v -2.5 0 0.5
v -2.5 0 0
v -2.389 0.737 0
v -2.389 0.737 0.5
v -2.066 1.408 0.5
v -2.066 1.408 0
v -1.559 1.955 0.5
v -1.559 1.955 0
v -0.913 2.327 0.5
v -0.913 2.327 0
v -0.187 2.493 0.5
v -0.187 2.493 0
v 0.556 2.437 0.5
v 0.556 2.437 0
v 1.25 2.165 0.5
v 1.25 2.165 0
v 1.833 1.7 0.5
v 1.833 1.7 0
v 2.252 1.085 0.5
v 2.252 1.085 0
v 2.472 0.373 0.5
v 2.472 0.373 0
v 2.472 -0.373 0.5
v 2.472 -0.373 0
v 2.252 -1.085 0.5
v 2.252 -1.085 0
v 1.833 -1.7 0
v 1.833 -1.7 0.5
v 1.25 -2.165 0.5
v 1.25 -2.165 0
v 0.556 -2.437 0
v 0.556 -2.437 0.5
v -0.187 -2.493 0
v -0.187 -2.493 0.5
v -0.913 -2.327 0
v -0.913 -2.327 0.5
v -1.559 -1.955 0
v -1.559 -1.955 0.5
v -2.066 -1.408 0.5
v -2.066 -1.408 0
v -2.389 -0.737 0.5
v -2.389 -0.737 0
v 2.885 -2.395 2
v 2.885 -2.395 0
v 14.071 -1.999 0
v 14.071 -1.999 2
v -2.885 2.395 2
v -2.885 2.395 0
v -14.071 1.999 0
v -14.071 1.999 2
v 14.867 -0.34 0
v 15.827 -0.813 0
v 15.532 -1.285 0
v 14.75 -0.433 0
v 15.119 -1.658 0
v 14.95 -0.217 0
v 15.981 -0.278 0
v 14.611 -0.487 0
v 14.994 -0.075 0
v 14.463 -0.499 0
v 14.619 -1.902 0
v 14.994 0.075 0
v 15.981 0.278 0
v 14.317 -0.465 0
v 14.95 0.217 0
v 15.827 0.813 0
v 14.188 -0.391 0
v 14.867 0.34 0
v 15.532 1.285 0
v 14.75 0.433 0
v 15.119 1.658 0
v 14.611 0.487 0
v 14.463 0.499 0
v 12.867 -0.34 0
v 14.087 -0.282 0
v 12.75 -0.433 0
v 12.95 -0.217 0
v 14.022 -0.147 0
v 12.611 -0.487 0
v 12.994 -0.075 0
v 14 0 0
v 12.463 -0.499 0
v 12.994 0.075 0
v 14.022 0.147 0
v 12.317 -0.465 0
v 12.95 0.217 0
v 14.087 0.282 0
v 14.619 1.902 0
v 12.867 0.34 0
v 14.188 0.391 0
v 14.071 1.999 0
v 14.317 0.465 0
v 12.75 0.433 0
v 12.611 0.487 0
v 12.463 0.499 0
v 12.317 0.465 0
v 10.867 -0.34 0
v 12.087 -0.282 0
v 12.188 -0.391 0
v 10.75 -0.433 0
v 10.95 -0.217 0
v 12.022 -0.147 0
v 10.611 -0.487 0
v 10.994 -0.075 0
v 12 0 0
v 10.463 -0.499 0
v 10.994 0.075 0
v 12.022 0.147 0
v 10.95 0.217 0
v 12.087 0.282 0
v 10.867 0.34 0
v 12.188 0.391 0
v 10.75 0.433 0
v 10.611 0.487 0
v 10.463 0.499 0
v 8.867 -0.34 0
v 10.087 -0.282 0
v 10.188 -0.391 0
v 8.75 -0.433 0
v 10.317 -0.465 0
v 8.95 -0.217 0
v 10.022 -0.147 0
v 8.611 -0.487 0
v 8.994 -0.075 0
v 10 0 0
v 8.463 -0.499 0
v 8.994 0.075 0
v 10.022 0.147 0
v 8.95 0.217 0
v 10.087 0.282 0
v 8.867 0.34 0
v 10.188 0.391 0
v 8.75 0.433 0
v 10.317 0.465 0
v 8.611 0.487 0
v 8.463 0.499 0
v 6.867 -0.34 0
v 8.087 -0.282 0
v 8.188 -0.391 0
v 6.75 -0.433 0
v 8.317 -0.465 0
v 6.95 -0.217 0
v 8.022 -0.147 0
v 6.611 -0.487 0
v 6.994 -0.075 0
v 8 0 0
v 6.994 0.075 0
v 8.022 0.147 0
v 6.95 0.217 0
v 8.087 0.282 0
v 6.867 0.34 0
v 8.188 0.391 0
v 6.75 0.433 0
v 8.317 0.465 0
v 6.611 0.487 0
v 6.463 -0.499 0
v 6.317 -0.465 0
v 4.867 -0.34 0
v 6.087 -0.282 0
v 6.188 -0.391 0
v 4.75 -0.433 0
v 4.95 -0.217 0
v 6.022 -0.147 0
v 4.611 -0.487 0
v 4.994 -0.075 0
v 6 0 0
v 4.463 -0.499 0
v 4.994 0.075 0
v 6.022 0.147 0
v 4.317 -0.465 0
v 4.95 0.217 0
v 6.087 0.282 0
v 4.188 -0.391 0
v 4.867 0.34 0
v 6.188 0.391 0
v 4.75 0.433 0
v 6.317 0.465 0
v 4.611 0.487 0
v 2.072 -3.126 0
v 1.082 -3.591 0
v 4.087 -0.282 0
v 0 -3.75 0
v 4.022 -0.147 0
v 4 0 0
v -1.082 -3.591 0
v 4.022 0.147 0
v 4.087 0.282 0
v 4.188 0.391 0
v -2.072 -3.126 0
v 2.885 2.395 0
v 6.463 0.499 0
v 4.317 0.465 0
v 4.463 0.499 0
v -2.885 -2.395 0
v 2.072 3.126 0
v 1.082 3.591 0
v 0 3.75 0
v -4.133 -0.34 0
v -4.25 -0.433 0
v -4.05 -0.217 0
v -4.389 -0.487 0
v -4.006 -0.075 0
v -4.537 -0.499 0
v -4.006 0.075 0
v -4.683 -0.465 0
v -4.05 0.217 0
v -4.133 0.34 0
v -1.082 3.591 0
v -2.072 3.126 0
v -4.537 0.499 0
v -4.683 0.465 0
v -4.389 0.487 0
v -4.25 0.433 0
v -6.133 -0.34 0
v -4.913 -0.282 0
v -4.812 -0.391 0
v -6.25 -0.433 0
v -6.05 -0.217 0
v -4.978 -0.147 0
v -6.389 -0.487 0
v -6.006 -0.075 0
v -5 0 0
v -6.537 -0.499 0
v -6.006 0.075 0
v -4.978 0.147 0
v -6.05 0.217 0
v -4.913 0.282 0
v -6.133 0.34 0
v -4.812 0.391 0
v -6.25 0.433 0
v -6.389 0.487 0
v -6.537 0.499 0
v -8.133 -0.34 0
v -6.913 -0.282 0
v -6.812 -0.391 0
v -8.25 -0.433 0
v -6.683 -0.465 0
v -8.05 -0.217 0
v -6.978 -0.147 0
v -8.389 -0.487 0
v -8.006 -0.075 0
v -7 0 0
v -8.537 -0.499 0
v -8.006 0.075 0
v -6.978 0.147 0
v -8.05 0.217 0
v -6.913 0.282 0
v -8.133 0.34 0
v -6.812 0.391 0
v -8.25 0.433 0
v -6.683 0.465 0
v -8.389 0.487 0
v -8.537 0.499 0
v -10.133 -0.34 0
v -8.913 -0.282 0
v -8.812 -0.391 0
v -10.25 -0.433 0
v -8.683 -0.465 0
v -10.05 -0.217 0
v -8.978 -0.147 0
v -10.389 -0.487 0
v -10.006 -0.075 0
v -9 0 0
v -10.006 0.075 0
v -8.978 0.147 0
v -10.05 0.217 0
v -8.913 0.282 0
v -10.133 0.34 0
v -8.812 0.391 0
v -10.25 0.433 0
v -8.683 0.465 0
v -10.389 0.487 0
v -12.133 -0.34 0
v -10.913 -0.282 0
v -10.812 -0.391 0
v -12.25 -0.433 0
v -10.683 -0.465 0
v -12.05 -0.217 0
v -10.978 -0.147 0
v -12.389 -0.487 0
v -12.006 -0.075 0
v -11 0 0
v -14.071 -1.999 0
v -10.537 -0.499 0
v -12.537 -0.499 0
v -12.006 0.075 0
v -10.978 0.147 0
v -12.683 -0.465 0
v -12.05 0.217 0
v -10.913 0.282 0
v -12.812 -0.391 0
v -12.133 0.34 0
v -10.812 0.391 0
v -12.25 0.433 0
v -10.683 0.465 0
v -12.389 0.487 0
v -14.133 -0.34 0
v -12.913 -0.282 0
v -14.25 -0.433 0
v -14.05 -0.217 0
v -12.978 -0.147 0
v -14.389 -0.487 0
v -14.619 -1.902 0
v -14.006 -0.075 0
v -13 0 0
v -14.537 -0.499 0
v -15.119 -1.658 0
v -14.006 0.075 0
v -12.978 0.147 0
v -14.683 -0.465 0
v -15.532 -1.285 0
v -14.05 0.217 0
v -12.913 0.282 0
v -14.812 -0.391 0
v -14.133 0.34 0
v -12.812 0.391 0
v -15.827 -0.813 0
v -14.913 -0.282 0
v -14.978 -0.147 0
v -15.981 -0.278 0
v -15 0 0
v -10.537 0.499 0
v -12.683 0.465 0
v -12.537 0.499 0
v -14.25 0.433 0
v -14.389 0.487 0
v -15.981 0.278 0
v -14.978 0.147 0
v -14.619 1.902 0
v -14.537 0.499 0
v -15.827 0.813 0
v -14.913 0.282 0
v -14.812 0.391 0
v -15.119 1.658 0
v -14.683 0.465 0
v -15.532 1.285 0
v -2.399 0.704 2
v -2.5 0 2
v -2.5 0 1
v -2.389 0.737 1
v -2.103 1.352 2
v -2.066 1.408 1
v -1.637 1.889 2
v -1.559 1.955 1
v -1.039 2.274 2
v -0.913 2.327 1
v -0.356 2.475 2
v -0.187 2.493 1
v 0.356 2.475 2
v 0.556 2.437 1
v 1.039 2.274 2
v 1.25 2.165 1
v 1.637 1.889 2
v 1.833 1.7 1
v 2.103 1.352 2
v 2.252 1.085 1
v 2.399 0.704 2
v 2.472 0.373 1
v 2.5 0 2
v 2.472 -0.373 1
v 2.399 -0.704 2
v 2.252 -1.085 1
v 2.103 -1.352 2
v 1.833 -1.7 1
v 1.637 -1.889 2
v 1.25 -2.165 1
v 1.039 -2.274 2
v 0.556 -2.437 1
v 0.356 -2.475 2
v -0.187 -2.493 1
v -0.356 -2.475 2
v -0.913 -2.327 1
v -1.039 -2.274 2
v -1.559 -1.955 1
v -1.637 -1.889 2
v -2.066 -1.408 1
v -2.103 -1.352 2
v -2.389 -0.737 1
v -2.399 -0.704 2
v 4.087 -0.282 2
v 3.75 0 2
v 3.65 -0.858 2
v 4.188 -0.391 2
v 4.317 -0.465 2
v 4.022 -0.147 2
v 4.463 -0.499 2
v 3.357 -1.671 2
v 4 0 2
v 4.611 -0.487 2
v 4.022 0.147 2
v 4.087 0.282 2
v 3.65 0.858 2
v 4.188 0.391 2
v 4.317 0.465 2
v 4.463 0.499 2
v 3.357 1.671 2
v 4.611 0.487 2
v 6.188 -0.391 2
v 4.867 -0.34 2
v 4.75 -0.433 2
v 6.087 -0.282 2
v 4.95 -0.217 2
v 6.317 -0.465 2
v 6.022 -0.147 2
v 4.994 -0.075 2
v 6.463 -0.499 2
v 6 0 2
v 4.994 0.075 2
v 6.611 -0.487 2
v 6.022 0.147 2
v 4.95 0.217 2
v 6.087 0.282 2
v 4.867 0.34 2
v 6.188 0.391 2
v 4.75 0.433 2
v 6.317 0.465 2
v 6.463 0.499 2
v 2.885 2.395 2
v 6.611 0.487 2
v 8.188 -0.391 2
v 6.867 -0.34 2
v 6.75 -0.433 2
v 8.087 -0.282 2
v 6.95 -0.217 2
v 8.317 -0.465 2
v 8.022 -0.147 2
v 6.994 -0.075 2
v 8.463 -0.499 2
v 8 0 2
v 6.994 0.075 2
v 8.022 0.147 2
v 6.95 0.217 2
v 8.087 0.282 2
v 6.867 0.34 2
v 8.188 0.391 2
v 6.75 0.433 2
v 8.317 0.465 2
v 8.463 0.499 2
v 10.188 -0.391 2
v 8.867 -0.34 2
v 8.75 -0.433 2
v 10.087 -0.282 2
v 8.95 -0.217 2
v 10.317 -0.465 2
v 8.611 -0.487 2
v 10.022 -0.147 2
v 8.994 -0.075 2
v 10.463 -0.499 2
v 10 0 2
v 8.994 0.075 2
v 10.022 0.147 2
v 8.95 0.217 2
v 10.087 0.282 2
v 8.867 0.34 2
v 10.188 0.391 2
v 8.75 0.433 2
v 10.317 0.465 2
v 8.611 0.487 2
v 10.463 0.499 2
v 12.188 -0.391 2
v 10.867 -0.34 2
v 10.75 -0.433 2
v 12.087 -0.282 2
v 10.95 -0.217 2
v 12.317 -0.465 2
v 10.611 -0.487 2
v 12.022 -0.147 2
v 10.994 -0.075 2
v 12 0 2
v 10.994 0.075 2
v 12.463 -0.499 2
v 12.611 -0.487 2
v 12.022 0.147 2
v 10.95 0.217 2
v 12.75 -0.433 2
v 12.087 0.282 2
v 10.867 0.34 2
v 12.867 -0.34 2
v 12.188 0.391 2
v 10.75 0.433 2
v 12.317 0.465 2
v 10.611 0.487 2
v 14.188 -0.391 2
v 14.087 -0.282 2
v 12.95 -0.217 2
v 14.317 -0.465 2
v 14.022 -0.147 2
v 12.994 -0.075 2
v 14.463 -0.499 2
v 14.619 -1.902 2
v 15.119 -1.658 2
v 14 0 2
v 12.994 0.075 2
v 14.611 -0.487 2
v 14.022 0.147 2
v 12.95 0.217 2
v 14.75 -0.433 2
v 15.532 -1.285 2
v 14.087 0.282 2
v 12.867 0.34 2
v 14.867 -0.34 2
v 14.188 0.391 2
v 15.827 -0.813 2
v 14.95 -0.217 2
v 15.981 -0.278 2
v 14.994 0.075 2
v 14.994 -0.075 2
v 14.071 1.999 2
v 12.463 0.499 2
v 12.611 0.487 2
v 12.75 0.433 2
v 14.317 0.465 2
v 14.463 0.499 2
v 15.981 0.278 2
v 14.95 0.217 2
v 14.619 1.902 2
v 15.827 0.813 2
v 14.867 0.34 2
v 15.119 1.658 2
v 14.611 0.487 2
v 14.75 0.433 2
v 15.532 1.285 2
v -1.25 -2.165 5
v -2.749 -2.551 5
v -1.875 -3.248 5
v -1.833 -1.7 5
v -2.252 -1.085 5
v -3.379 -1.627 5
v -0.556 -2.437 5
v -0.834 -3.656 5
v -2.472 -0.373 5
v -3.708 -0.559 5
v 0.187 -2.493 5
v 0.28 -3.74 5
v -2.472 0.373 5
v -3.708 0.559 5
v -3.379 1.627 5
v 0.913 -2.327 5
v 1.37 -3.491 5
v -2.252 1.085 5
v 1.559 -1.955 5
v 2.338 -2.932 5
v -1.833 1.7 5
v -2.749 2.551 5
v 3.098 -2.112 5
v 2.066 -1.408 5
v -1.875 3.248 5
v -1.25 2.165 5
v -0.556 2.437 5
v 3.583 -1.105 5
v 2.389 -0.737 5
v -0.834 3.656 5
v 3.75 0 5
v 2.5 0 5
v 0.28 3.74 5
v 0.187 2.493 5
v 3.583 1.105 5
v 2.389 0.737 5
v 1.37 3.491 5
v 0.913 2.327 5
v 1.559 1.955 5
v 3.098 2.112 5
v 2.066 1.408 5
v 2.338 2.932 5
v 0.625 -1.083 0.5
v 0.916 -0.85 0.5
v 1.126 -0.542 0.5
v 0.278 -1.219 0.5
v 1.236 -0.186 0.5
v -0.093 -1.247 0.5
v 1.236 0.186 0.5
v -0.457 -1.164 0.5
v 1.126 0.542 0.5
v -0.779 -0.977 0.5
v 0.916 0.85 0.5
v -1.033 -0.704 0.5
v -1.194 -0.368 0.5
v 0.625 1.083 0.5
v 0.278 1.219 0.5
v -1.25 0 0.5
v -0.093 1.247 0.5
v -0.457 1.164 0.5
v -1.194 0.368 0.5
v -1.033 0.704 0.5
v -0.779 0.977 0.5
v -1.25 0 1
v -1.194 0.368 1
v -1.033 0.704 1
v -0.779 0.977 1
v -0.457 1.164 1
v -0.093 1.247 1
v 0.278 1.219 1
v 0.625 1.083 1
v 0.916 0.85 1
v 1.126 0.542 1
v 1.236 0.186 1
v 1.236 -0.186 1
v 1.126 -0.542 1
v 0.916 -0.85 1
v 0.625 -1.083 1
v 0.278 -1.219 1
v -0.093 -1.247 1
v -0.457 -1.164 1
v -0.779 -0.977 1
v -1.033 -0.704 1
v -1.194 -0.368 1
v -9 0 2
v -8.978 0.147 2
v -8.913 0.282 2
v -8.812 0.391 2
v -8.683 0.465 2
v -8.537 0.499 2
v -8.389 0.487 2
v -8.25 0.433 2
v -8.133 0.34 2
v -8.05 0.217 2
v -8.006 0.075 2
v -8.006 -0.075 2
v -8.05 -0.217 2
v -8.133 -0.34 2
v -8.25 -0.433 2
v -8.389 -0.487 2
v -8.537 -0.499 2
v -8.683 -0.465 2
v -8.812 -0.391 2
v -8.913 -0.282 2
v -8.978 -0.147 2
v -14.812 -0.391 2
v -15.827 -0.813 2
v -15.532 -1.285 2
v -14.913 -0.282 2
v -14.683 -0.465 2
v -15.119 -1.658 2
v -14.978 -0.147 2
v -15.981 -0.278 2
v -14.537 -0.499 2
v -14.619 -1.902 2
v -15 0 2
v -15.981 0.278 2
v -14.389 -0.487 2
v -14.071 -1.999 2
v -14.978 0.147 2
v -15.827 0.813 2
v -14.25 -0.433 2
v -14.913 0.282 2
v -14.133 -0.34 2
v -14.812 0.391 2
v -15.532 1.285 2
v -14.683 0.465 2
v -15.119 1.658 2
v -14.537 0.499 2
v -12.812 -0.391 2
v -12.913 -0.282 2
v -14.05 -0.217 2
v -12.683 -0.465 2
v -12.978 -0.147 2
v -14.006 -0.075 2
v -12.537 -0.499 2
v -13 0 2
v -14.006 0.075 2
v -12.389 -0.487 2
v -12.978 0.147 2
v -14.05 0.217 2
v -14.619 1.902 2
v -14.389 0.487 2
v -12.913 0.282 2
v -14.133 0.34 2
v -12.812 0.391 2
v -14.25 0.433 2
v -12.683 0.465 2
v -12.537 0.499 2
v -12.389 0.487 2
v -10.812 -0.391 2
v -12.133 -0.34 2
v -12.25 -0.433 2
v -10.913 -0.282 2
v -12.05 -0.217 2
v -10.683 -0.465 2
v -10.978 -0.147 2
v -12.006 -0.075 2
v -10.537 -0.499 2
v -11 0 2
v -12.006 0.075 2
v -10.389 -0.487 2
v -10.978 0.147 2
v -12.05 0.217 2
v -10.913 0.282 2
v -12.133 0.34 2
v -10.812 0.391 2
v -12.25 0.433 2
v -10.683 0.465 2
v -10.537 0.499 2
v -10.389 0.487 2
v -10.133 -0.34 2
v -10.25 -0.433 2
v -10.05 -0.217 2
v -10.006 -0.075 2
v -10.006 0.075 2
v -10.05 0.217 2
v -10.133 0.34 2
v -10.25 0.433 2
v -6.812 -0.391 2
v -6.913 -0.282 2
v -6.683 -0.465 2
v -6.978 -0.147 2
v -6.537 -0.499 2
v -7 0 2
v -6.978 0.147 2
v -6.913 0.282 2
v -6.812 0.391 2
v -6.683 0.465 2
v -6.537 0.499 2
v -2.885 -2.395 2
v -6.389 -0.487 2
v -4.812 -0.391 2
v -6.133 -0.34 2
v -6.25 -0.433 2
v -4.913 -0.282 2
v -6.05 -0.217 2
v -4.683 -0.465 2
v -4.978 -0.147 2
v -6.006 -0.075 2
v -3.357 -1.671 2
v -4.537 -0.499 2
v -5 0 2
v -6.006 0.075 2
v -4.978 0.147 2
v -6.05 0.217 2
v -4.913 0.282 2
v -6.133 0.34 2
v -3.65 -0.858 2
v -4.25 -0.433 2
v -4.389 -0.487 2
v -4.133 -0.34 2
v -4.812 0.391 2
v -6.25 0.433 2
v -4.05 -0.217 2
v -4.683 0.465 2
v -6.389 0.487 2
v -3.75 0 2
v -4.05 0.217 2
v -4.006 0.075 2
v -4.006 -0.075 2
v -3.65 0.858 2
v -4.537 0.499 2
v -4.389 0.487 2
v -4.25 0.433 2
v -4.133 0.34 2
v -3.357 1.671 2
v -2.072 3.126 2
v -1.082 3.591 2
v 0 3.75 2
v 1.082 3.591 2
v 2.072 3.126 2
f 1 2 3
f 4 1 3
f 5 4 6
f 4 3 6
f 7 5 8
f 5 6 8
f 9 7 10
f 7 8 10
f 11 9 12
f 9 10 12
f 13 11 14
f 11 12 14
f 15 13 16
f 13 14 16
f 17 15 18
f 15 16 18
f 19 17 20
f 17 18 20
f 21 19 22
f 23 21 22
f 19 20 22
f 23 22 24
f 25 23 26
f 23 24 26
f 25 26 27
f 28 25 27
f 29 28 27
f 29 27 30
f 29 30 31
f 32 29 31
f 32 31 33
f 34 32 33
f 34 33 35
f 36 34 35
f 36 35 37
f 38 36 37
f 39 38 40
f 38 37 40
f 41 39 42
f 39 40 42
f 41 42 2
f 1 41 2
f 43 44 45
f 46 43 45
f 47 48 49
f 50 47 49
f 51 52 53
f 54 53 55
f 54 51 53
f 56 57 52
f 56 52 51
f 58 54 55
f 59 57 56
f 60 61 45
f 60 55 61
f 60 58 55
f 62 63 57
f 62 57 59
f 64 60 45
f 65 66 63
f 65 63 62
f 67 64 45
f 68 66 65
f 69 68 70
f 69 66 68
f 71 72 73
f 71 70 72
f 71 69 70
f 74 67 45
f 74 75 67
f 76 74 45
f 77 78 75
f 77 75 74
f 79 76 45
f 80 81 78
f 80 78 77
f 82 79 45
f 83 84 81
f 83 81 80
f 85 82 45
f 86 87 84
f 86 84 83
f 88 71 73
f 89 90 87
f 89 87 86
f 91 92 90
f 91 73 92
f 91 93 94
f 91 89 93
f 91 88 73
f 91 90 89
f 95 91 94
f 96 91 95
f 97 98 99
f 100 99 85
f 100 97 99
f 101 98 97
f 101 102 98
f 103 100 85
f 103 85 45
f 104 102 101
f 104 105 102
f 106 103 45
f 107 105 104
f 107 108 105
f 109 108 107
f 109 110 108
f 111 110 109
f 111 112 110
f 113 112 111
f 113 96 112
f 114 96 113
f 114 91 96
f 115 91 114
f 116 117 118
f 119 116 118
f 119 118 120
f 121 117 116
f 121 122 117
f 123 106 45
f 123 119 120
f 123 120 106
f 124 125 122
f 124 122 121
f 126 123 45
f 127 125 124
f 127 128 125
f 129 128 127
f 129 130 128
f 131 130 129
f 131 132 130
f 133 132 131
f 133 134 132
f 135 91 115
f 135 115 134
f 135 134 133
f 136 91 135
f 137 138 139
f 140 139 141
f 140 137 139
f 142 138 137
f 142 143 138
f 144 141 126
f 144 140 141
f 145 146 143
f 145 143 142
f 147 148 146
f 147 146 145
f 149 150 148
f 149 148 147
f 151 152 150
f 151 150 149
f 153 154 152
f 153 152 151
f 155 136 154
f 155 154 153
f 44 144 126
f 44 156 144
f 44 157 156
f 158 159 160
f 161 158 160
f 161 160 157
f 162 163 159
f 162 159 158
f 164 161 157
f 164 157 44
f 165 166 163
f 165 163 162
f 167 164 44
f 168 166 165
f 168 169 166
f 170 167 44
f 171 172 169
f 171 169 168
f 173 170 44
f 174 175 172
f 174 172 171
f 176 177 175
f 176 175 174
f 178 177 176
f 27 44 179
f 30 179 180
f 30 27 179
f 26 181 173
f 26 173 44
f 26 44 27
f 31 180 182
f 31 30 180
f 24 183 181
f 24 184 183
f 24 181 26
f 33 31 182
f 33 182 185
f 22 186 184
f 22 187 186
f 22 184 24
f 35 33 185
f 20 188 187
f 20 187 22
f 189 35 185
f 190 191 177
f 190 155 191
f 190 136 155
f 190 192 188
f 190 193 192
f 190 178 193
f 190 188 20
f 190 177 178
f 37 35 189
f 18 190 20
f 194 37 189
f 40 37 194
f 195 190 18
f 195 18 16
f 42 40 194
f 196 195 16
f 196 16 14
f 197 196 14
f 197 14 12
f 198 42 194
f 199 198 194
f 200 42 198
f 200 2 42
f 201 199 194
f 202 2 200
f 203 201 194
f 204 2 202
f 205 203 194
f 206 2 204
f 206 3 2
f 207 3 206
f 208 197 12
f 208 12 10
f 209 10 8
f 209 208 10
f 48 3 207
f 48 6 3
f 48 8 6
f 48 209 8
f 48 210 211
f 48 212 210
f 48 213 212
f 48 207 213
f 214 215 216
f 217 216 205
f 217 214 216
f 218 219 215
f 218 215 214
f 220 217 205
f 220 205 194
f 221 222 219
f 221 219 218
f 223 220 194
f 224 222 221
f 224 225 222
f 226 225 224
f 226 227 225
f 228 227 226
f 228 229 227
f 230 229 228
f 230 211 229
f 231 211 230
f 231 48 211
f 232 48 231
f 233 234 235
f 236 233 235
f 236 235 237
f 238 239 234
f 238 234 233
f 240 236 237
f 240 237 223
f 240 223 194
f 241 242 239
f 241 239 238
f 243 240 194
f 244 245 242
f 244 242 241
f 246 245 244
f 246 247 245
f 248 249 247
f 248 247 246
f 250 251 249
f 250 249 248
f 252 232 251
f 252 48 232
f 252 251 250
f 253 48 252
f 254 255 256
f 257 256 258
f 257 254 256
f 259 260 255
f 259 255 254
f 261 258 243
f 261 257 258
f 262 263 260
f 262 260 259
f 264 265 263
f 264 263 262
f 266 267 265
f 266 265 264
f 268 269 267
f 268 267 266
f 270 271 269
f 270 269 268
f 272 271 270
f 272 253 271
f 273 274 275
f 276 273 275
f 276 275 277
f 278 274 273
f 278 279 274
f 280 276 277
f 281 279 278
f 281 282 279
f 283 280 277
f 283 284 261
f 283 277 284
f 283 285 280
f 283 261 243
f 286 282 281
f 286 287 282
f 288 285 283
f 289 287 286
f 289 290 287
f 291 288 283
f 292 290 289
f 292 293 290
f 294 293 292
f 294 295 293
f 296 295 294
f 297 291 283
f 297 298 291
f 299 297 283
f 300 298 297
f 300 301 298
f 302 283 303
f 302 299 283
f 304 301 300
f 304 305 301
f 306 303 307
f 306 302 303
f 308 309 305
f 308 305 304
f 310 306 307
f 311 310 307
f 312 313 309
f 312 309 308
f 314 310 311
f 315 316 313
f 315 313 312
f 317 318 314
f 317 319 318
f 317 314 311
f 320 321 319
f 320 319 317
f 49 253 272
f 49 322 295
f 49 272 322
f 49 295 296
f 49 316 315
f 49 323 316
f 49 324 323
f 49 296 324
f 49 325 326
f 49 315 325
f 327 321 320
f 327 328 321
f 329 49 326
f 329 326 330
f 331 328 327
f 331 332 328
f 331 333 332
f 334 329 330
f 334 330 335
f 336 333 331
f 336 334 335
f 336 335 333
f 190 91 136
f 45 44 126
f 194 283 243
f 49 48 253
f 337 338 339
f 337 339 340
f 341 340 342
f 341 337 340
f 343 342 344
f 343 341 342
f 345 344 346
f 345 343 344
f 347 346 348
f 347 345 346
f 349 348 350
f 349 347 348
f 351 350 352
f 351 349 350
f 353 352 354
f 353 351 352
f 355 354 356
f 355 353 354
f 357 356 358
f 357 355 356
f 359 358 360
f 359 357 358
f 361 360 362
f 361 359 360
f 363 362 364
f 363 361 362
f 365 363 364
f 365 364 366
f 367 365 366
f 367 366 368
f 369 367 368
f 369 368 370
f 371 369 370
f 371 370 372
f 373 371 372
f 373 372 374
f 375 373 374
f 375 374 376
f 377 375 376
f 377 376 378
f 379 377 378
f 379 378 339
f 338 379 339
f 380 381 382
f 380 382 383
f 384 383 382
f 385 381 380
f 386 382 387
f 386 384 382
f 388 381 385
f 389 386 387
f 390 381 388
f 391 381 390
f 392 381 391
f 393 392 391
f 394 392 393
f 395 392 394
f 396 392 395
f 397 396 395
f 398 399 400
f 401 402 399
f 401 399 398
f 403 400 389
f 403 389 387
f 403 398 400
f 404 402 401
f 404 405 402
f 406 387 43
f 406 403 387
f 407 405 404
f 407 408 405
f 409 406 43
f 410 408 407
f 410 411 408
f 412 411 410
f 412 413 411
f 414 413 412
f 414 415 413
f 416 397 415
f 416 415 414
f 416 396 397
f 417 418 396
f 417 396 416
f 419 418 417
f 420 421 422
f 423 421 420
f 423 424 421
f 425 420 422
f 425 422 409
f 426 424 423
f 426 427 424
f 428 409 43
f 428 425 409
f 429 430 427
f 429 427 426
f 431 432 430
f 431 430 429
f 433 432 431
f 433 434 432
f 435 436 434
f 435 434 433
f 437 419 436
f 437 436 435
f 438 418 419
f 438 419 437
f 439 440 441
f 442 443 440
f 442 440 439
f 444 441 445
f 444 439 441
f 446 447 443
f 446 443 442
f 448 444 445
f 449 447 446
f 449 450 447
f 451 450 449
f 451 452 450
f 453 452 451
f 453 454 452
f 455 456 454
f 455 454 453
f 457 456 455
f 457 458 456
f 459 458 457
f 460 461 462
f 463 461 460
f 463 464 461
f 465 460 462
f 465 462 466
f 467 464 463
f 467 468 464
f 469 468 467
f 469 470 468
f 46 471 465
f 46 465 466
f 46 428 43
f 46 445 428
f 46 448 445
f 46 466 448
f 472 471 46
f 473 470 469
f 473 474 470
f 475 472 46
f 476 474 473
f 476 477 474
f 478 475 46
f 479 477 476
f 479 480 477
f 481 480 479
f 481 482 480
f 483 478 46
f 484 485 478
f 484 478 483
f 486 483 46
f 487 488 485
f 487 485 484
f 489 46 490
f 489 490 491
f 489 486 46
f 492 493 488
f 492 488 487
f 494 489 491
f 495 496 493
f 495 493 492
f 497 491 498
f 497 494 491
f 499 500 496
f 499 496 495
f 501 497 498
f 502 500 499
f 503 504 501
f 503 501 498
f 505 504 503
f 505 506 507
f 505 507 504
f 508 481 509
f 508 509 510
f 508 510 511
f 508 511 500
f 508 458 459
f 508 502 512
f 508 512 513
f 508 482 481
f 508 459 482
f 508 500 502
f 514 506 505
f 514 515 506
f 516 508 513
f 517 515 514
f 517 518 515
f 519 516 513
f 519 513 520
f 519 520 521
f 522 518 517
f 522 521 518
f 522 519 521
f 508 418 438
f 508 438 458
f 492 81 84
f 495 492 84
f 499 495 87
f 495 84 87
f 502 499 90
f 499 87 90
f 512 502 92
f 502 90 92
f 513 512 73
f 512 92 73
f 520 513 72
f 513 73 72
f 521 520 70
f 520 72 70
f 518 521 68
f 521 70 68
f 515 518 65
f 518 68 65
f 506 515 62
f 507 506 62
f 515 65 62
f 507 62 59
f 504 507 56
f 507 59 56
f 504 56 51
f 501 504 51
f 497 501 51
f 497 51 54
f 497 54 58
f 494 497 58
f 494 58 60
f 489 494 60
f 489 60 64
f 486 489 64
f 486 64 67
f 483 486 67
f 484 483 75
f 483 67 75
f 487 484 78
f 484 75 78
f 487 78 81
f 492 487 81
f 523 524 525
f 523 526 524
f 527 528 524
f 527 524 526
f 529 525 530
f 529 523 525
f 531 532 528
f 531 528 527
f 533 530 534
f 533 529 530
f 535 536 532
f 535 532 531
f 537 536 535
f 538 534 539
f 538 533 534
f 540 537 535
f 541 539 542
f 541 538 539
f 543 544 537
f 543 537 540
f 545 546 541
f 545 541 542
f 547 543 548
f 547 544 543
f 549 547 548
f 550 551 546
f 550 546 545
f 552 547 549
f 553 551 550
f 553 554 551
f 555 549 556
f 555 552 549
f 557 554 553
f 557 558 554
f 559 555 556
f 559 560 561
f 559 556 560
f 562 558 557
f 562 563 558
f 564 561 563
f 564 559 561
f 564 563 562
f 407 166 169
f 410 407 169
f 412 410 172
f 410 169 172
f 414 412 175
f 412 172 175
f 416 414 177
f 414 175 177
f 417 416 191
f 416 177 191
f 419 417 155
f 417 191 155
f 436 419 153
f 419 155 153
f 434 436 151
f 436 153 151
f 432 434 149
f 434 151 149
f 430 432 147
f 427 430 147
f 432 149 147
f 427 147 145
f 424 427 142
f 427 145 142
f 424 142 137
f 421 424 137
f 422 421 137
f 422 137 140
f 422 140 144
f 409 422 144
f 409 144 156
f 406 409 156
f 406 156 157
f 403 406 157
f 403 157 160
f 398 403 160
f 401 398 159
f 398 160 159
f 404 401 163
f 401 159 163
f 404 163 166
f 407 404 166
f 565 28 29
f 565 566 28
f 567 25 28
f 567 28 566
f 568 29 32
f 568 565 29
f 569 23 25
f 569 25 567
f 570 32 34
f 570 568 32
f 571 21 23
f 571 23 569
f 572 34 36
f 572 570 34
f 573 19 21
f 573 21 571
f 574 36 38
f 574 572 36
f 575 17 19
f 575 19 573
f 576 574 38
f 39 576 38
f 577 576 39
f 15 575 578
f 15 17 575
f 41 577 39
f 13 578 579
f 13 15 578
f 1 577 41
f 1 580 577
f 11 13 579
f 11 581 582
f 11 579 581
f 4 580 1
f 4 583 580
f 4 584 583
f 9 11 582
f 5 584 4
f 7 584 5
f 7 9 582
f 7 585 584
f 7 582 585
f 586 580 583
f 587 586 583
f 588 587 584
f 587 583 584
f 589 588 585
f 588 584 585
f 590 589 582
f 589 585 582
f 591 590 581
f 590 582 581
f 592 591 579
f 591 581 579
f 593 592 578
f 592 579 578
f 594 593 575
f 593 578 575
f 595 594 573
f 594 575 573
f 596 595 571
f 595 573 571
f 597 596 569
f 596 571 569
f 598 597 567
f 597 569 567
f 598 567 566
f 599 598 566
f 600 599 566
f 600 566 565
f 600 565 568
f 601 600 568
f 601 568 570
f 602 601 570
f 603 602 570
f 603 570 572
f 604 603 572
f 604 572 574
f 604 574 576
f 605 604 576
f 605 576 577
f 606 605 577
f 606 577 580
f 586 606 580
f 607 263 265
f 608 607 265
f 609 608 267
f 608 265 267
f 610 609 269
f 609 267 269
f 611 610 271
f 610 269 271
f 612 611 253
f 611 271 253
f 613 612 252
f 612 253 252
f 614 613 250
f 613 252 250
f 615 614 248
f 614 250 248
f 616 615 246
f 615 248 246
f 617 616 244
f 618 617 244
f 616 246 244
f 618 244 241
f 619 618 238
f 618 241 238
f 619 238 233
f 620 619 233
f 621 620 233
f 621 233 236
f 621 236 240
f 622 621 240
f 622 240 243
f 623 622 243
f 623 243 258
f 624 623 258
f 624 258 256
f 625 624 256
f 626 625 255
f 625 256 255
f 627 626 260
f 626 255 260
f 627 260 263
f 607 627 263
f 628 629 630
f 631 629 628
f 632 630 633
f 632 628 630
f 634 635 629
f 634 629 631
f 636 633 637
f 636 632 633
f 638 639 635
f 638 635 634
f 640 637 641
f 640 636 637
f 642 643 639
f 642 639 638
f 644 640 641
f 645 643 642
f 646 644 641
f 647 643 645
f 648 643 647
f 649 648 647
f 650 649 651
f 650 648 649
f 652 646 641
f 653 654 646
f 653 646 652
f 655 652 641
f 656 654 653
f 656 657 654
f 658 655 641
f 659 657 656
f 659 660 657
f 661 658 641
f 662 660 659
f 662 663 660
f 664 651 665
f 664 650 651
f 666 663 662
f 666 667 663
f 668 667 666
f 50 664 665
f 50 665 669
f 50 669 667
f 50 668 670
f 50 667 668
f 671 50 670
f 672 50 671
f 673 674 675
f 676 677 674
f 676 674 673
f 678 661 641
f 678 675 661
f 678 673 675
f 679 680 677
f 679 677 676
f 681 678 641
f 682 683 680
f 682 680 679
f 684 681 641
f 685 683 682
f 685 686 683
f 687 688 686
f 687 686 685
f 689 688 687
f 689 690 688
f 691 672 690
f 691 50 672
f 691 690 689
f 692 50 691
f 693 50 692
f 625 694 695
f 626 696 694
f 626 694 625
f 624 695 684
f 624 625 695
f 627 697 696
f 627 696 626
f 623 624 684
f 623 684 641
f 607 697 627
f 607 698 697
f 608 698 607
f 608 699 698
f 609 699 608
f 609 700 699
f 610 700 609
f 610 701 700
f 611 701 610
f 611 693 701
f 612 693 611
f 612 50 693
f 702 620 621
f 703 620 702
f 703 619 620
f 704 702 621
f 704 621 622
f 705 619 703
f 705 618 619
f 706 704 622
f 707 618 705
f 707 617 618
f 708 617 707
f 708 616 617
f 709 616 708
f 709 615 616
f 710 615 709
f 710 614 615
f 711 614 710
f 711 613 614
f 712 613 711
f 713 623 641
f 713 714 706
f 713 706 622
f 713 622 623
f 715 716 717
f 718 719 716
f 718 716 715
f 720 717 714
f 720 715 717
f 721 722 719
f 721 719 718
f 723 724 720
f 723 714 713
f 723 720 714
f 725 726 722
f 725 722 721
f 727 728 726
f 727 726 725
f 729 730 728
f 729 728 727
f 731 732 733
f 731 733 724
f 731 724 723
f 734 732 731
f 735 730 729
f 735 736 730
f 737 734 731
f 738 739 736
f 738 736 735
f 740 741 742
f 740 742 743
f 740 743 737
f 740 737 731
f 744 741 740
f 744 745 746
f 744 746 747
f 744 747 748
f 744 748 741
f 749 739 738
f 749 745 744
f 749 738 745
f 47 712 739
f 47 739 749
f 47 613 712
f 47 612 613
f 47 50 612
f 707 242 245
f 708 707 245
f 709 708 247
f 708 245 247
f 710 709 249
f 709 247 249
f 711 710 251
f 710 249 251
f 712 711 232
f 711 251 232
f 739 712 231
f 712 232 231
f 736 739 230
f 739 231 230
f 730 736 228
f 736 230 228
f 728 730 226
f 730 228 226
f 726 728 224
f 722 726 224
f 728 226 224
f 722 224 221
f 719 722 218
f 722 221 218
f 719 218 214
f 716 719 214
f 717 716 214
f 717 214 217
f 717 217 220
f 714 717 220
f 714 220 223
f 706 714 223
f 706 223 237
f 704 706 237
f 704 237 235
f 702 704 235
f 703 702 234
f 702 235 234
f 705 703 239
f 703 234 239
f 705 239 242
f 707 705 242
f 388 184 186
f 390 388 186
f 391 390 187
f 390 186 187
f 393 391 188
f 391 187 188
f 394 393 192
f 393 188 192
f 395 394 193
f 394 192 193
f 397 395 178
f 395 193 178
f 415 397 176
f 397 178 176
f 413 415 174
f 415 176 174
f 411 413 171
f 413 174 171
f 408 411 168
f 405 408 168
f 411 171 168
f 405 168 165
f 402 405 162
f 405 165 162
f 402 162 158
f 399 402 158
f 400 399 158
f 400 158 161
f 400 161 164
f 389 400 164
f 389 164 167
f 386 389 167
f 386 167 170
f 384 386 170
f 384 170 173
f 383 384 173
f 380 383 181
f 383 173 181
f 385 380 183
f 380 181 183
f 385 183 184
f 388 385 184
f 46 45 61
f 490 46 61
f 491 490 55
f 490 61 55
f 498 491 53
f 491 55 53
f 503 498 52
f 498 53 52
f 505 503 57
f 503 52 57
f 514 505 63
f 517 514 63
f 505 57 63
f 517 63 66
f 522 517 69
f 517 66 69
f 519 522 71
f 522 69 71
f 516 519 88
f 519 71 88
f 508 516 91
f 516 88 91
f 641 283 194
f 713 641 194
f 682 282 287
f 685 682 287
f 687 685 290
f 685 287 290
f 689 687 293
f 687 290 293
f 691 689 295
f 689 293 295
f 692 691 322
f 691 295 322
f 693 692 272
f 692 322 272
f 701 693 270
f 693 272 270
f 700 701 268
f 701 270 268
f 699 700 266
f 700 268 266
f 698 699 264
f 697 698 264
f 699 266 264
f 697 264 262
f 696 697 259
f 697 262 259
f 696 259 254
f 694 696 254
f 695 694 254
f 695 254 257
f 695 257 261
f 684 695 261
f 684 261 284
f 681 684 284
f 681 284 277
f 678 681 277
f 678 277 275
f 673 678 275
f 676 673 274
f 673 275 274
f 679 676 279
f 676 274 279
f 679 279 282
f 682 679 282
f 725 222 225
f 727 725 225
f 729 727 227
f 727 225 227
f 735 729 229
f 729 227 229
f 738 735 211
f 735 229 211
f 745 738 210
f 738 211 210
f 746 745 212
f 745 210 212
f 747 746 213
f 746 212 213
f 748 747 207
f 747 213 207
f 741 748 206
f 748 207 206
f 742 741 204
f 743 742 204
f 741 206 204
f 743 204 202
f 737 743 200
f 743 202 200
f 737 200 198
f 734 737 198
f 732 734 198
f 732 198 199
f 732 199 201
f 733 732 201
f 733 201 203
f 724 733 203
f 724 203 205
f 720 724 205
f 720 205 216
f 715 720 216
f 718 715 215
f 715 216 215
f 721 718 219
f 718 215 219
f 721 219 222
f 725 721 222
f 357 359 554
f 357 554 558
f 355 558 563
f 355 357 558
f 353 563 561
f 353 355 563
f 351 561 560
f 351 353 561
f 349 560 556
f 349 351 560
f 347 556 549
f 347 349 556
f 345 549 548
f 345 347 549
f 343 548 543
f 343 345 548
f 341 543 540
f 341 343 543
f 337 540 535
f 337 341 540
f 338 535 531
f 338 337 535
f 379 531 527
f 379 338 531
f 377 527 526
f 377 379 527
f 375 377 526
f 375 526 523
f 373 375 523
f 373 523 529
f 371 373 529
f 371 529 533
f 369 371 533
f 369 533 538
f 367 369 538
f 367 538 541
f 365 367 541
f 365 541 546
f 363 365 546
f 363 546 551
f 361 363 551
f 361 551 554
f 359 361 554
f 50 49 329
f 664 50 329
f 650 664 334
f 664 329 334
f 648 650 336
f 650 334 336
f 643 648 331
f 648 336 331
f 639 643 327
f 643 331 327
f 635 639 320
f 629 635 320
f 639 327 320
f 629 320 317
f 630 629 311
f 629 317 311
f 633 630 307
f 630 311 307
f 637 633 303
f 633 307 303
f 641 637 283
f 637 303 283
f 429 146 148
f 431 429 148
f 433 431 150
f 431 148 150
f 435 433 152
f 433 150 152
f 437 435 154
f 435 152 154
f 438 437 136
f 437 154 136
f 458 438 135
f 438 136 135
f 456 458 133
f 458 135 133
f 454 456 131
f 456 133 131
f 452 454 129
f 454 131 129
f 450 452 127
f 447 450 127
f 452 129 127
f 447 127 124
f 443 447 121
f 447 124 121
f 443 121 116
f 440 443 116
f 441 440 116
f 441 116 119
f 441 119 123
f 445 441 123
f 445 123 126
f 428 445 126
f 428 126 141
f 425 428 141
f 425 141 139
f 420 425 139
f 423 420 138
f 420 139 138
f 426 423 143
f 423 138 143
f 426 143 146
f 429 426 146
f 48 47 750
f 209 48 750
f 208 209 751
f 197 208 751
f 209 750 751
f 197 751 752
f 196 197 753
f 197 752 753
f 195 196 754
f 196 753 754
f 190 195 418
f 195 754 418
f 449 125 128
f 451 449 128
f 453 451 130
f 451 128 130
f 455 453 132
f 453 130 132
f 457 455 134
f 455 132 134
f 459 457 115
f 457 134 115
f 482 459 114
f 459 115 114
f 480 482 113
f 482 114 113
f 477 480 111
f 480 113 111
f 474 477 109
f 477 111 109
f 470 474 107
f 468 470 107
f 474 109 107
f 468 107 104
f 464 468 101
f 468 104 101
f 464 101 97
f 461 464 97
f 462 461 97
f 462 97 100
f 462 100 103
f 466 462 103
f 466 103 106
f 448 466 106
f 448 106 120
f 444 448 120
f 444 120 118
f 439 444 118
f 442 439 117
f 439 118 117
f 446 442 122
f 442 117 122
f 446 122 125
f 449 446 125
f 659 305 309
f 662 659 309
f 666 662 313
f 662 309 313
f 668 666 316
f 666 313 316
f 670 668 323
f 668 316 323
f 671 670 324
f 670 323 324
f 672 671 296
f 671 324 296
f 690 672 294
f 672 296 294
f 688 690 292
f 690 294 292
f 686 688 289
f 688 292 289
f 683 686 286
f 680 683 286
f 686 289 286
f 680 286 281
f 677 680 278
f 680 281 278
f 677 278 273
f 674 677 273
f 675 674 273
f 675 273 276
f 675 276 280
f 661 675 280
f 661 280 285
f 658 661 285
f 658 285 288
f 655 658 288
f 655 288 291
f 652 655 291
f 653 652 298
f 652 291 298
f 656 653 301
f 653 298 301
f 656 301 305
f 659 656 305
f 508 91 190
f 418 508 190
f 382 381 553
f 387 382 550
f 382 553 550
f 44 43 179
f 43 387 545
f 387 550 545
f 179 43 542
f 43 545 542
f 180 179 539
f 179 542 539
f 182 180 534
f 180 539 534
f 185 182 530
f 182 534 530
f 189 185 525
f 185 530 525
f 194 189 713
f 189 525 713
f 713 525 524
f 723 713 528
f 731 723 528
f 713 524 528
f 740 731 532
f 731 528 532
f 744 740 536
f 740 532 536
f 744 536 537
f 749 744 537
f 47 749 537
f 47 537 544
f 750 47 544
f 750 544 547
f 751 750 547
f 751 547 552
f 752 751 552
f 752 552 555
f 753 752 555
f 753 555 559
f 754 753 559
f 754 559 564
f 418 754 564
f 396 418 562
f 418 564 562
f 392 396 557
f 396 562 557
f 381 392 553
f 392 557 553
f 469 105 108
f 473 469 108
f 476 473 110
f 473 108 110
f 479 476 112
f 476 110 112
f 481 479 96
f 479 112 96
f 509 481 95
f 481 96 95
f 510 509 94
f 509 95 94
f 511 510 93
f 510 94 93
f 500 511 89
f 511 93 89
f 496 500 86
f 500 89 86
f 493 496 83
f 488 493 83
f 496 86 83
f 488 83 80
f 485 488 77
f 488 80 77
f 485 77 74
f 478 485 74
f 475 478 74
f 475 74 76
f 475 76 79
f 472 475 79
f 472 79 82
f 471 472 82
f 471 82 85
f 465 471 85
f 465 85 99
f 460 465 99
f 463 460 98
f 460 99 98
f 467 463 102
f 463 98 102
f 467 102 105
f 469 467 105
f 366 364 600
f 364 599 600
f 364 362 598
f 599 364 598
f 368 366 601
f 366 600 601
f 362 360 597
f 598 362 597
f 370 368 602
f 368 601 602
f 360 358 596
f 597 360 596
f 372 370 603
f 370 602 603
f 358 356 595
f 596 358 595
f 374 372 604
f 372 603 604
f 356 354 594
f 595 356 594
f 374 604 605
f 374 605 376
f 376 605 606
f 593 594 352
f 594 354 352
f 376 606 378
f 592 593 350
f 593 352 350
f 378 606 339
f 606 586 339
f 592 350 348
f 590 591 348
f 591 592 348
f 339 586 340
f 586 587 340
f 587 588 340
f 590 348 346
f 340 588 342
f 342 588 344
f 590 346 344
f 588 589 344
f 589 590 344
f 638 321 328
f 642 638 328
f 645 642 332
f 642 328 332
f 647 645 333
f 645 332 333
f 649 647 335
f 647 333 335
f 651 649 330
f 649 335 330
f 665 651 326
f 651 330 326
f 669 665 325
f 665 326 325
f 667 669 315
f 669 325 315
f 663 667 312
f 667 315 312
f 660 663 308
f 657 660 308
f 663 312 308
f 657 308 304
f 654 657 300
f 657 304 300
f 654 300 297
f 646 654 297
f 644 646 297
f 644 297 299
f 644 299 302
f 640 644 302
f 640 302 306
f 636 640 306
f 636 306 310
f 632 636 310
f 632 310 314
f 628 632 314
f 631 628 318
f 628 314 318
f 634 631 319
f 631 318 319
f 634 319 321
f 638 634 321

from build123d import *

# Parameters (mm, degrees)
EXTRUDE_3_DEPTH     = 2
EXTRUDE_3_2_DEPTH   = 2
SKETCH_2_R          = 3.75
SKETCH_2_R_2        = 2.5
EXTRUDE_5_DEPTH     = 3
SKETCH_3_R          = 3.75
SKETCH_3_R_2        = 2.5
EXTRUDE_6_DEPTH     = 2
SKETCH_4_R          = 0.5
CUT_EXTRUDE_1_DEPTH = 2
SKETCH_5_R          = 2.5
EXTRUDE_7_DEPTH     = 1
SKETCH_6_R          = 2.5
CUT_EXTRUDE_2_DEPTH = 0.5
SKETCH_7_R          = 1.25
CUT_EXTRUDE_3_DEPTH = 5


with BuildPart() as part:
    # Эскиз1 → Бобышка-Вытянуть3 (new body)
    with BuildSketch(Plane.XY):
        with BuildLine():
            ThreePointArc((-2.88547071, -2.395111434), (-3.527252129, -1.273182005), (-3.75, 0))
            ThreePointArc((-3.75, 0), (-3.527252129, 1.273182005), (-2.88547071, 2.395111434))
            Line((-2.88547071, 2.395111434), (-14.07082784, 1.998745461))
            ThreePointArc((-14.07082784, 1.998745461), (-16, 0), (-14.07082784, -1.998745461))
            Line((-14.07082784, -1.998745461), (-2.88547071, -2.395111434))
        make_face()
    extrude(amount=EXTRUDE_3_DEPTH)



with BuildPart() as body_2:
    # Эскиз1 → Extrude 3 2 (new body)
    with BuildSketch(Plane.XY):
        with BuildLine():
            Line((14.07082784, 1.998745461), (2.88547071, 2.395111434))
            ThreePointArc((2.88547071, 2.395111434), (3.75, 0), (2.88547071, -2.395111434))
            Line((2.88547071, -2.395111434), (14.07082784, -1.998745461))
            ThreePointArc((14.07082784, -1.998745461), (16, 0), (14.07082784, 1.998745461))
        make_face()
    extrude(amount=EXTRUDE_3_2_DEPTH)


with BuildPart() as body_3:
    # Эскиз2 → Бобышка-Вытянуть5 (new body)
    with BuildSketch(Plane.XY.offset(2)):
        Circle(SKETCH_2_R)
        Circle(SKETCH_2_R_2, mode=Mode.SUBTRACT)
    extrude(amount=EXTRUDE_5_DEPTH)


with BuildPart() as part_1:
    add(part.part)

    add(body_2.part)  # Бобышка-Вытянуть6 merges body 2

    add(body_3.part)  # Бобышка-Вытянуть6 merges body 3
    # Эскиз3 → Бобышка-Вытянуть6 (add)
    with BuildSketch(Plane(origin=(0, 0, 2), x_dir=(-1, 0, 0), z_dir=(0, 0, -1))):
        Circle(SKETCH_3_R)
        Circle(SKETCH_3_R_2, mode=Mode.SUBTRACT)
    extrude(amount=EXTRUDE_6_DEPTH)

    # Эскиз4 → Вырез-Вытянуть1 (cut)
    with BuildSketch(Plane(origin=(0, 0, 0), x_dir=(-1, 0, 0), z_dir=(0, 0, -1))):
        with Locations((-14.5, 0)):
            Circle(SKETCH_4_R)
        with Locations((-4.5, 0)):
            Circle(SKETCH_4_R)
        with Locations((-6.5, 0)):
            Circle(SKETCH_4_R)
        with Locations((-8.5, 0)):
            Circle(SKETCH_4_R)
        with Locations((-10.5, 0)):
            Circle(SKETCH_4_R)
        with Locations((-12.5, 0)):
            Circle(SKETCH_4_R)
        with Locations((4.5, 0)):
            Circle(SKETCH_4_R)
        with Locations((6.5, 0)):
            Circle(SKETCH_4_R)
        with Locations((8.5, 0)):
            Circle(SKETCH_4_R)
        with Locations((10.5, 0)):
            Circle(SKETCH_4_R)
        with Locations((12.5, 0)):
            Circle(SKETCH_4_R)
        with Locations((14.5, 0)):
            Circle(SKETCH_4_R)
    extrude(amount=-CUT_EXTRUDE_1_DEPTH, mode=Mode.SUBTRACT)

    # Эскиз5 → Бобышка-Вытянуть7 (add)
    with BuildSketch(Plane(origin=(0, 0, 0), x_dir=(-1, 0, 0), z_dir=(0, 0, -1))):
        Circle(SKETCH_5_R)
    extrude(amount=-EXTRUDE_7_DEPTH)

    # Эскиз6 → Вырез-Вытянуть2 (cut)
    with BuildSketch(Plane(origin=(0, 0, 0), x_dir=(-1, 0, 0), z_dir=(0, 0, -1))):
        Circle(SKETCH_6_R)
    extrude(amount=-CUT_EXTRUDE_2_DEPTH, mode=Mode.SUBTRACT)

    # Эскиз7 → Вырез-Вытянуть3 (cut)
    with BuildSketch(Plane(origin=(0, 0, 0.5), x_dir=(-1, 0, 0), z_dir=(0, 0, -1))):
        Circle(SKETCH_7_R)
    extrude(amount=-CUT_EXTRUDE_3_DEPTH, mode=Mode.SUBTRACT)


solid = part_1.part
